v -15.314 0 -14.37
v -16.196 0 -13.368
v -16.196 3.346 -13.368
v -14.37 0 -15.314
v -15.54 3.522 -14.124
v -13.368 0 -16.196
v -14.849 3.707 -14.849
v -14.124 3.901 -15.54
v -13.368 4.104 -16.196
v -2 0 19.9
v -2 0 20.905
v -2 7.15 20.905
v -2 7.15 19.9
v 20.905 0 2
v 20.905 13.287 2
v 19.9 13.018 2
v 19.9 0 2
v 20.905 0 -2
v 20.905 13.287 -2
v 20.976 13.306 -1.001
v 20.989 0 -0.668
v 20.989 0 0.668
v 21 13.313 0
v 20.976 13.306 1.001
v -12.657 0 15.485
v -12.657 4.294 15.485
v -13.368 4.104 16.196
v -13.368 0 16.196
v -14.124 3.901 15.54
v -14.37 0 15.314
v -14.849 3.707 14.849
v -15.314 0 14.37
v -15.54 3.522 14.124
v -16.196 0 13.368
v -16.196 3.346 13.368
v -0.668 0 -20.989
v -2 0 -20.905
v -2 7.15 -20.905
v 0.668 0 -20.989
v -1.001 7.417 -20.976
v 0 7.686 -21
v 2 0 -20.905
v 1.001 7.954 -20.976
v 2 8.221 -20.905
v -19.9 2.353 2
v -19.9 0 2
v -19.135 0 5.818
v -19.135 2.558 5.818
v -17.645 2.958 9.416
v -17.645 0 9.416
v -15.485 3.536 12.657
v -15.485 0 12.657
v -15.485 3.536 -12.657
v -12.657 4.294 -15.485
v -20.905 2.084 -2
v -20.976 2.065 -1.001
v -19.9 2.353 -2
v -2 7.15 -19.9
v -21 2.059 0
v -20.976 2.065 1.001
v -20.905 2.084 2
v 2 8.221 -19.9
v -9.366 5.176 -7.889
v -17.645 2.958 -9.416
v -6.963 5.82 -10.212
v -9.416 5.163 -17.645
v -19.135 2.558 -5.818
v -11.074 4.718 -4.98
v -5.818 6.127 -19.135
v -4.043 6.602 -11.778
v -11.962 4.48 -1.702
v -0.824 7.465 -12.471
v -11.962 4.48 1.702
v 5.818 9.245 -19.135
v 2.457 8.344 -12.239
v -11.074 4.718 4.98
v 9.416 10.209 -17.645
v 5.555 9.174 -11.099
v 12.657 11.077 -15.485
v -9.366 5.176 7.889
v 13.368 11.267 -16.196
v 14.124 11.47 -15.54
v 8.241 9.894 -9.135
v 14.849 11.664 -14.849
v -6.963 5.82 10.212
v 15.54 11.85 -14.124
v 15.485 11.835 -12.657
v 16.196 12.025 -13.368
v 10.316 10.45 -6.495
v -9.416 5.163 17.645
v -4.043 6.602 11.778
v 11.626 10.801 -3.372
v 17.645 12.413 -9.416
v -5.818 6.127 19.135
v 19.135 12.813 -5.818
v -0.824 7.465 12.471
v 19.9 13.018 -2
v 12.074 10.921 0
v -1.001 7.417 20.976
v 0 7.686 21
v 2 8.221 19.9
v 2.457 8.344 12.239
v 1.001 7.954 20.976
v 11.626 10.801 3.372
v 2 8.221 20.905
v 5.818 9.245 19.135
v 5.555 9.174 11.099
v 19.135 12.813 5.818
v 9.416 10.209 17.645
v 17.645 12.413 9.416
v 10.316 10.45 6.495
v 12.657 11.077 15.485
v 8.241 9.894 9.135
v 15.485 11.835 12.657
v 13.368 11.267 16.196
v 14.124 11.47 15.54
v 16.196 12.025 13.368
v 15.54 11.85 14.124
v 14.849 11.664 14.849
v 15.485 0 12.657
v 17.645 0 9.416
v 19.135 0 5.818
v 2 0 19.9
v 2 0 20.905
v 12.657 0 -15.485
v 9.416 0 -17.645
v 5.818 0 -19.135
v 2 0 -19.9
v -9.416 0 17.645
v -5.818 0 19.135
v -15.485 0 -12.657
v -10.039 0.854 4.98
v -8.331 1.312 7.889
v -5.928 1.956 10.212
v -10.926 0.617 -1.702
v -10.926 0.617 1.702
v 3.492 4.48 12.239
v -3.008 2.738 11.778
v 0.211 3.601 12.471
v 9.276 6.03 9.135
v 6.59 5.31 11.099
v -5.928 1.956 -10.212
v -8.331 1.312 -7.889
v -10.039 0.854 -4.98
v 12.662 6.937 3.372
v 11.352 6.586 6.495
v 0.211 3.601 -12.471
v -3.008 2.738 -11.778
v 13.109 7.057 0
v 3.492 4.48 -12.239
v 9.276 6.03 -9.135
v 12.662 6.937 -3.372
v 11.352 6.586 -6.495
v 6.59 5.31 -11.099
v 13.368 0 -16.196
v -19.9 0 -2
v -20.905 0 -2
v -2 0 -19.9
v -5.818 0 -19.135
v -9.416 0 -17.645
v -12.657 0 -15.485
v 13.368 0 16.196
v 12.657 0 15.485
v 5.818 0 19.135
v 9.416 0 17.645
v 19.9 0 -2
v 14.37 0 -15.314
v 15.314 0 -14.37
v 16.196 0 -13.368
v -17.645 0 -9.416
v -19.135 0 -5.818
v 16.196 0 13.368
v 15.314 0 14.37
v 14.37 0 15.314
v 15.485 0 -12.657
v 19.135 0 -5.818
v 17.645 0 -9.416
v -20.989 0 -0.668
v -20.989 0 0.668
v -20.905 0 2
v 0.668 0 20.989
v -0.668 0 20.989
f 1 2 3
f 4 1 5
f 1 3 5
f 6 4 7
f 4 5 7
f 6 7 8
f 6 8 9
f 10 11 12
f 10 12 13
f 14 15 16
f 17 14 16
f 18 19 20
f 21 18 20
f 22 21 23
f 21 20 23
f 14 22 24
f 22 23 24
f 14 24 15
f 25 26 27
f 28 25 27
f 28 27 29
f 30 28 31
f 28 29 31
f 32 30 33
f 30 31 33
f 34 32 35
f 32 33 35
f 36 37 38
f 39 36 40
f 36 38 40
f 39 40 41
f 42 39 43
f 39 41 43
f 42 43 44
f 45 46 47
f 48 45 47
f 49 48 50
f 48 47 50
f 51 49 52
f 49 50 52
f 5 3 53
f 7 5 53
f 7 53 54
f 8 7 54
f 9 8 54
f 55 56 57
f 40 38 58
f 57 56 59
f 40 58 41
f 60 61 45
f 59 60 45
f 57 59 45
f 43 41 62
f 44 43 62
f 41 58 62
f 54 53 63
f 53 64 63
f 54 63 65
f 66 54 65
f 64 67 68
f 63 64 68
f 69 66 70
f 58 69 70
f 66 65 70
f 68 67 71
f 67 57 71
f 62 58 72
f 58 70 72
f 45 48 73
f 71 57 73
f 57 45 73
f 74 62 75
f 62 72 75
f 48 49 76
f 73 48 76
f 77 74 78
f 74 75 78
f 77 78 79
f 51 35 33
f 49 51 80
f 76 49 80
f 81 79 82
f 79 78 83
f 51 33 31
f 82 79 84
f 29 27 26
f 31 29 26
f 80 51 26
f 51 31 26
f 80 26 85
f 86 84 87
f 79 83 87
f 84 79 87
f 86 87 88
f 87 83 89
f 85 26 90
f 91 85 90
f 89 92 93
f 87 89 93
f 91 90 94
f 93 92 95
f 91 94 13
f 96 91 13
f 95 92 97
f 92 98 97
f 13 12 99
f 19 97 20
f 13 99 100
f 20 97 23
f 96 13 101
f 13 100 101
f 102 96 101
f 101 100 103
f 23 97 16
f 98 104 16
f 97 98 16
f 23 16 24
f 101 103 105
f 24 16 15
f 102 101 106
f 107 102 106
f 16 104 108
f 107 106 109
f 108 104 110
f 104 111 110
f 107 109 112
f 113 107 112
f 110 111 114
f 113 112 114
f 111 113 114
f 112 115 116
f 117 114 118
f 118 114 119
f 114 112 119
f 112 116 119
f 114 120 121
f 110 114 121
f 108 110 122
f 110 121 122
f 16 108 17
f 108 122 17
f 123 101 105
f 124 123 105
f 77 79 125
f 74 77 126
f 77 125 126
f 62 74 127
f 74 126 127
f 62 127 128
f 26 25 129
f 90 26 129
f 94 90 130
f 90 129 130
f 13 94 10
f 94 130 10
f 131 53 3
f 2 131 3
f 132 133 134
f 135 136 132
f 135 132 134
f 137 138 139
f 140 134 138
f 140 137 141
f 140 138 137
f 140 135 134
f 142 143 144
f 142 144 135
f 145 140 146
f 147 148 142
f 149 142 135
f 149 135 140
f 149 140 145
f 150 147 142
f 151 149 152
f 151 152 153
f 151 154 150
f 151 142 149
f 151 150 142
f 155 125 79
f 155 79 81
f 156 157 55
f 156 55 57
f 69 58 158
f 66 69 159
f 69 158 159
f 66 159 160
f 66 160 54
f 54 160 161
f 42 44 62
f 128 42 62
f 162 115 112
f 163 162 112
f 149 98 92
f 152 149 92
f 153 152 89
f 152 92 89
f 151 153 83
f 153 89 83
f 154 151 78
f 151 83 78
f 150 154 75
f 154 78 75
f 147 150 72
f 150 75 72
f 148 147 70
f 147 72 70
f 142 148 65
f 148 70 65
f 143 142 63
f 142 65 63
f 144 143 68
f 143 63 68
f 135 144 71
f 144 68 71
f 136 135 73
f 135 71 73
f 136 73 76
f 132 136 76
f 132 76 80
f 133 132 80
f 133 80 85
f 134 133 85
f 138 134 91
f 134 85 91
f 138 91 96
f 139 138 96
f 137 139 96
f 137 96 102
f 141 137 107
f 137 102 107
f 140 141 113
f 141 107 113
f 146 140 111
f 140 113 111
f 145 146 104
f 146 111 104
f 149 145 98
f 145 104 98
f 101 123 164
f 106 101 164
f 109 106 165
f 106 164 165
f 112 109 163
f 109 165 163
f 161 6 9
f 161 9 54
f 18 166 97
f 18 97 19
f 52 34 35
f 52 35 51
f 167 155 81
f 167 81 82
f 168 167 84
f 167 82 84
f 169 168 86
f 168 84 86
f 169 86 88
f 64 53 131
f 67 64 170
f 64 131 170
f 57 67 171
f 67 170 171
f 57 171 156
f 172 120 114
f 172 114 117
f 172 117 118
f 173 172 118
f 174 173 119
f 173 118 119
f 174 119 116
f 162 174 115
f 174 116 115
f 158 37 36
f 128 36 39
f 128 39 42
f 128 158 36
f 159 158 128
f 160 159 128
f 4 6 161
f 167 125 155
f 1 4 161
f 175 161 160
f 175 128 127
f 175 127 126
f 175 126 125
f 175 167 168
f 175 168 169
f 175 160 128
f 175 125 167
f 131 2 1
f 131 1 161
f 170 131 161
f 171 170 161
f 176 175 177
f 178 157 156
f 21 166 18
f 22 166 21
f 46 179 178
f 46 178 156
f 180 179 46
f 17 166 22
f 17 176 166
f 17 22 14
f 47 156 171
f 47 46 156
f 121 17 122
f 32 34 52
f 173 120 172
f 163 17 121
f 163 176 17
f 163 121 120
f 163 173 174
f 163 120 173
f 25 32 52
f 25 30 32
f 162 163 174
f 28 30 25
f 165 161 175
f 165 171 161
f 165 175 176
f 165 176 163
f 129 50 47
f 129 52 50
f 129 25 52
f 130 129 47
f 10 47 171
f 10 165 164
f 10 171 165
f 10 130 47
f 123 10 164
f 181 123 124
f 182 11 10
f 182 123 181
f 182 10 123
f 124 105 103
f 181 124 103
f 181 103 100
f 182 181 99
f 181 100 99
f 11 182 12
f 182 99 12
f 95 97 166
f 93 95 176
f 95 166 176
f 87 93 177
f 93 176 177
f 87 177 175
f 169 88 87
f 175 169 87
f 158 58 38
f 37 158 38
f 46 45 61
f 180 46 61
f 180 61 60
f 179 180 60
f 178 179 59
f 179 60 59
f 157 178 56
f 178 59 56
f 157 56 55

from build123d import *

# Parameters (mm, degrees)
SKETCH_1_R               = 20
EXTRUDE_1_DEPTH          = 20
EXTRUDE_2_DEPTH          = 20
PATTERN_CIRCULAR_1_COUNT = 8
CUT_EXTRUDE_1_DEPTH      = 34
SKETCH_5_R               = 12.5
CUT_EXTRUDE_2_DEPTH      = 4


with BuildPart() as part:
    # 草图1 → 凸台-拉伸1 (new body)
    with BuildSketch(Plane(origin=(0, 0, 0), x_dir=(1, 0, 0), z_dir=(0, 1, 0))):
        Circle(SKETCH_1_R)
    extrude(amount=EXTRUDE_1_DEPTH)

    # 草图3 → 凸台-拉伸2 (add)
    with BuildSketch(Plane(origin=(0, 20, 0), x_dir=(1, 0, 0), z_dir=(0, 1, 0))):
        with BuildLine():
            Line((-2, -20.90454496), (-2, 20.90454496))
            ThreePointArc((-2, 20.90454496), (0, 21), (2, 20.90454496))
            Line((2, 20.90454496), (2, -20.90454496))
            ThreePointArc((2, -20.90454496), (0, -21), (-2, -20.90454496))
        make_face()
    extrude_2 = extrude(amount=-EXTRUDE_2_DEPTH)

    # 阵列(圆周)1: 凸台-拉伸2 ×8 about axis
    pattern_circular_1_axis = Axis((0, 20, 0), (0, -1, 0))
    for i in range(1, PATTERN_CIRCULAR_1_COUNT):
        add(extrude_2.rotate(pattern_circular_1_axis, i * 360 / PATTERN_CIRCULAR_1_COUNT))

    # 草图2 → 切除-拉伸1 (cut, symmetric)
    with BuildSketch(Plane.XY):
        Polygon((-21.218882006, 2), (25.661502265, 14.561561106), (25.661502265, 41.51194957), (-21.218882006, 43.85785004), align=None)
    extrude(amount=CUT_EXTRUDE_1_DEPTH, both=True, mode=Mode.SUBTRACT)

    # 草图5 → 切除-拉伸2 (cut)
    with BuildSketch(Plane(origin=(-1.921395574, 7.170745905, 0), x_dir=(0.9659258262890681, 0.2588190451025218, 0), z_dir=(-0.2588190451025218, 0.9659258262890681, 0))):
        with Locations((1.989175071, 0)):
            Circle(SKETCH_5_R)
    extrude(amount=-CUT_EXTRUDE_2_DEPTH, mode=Mode.SUBTRACT)


solid = part.part
